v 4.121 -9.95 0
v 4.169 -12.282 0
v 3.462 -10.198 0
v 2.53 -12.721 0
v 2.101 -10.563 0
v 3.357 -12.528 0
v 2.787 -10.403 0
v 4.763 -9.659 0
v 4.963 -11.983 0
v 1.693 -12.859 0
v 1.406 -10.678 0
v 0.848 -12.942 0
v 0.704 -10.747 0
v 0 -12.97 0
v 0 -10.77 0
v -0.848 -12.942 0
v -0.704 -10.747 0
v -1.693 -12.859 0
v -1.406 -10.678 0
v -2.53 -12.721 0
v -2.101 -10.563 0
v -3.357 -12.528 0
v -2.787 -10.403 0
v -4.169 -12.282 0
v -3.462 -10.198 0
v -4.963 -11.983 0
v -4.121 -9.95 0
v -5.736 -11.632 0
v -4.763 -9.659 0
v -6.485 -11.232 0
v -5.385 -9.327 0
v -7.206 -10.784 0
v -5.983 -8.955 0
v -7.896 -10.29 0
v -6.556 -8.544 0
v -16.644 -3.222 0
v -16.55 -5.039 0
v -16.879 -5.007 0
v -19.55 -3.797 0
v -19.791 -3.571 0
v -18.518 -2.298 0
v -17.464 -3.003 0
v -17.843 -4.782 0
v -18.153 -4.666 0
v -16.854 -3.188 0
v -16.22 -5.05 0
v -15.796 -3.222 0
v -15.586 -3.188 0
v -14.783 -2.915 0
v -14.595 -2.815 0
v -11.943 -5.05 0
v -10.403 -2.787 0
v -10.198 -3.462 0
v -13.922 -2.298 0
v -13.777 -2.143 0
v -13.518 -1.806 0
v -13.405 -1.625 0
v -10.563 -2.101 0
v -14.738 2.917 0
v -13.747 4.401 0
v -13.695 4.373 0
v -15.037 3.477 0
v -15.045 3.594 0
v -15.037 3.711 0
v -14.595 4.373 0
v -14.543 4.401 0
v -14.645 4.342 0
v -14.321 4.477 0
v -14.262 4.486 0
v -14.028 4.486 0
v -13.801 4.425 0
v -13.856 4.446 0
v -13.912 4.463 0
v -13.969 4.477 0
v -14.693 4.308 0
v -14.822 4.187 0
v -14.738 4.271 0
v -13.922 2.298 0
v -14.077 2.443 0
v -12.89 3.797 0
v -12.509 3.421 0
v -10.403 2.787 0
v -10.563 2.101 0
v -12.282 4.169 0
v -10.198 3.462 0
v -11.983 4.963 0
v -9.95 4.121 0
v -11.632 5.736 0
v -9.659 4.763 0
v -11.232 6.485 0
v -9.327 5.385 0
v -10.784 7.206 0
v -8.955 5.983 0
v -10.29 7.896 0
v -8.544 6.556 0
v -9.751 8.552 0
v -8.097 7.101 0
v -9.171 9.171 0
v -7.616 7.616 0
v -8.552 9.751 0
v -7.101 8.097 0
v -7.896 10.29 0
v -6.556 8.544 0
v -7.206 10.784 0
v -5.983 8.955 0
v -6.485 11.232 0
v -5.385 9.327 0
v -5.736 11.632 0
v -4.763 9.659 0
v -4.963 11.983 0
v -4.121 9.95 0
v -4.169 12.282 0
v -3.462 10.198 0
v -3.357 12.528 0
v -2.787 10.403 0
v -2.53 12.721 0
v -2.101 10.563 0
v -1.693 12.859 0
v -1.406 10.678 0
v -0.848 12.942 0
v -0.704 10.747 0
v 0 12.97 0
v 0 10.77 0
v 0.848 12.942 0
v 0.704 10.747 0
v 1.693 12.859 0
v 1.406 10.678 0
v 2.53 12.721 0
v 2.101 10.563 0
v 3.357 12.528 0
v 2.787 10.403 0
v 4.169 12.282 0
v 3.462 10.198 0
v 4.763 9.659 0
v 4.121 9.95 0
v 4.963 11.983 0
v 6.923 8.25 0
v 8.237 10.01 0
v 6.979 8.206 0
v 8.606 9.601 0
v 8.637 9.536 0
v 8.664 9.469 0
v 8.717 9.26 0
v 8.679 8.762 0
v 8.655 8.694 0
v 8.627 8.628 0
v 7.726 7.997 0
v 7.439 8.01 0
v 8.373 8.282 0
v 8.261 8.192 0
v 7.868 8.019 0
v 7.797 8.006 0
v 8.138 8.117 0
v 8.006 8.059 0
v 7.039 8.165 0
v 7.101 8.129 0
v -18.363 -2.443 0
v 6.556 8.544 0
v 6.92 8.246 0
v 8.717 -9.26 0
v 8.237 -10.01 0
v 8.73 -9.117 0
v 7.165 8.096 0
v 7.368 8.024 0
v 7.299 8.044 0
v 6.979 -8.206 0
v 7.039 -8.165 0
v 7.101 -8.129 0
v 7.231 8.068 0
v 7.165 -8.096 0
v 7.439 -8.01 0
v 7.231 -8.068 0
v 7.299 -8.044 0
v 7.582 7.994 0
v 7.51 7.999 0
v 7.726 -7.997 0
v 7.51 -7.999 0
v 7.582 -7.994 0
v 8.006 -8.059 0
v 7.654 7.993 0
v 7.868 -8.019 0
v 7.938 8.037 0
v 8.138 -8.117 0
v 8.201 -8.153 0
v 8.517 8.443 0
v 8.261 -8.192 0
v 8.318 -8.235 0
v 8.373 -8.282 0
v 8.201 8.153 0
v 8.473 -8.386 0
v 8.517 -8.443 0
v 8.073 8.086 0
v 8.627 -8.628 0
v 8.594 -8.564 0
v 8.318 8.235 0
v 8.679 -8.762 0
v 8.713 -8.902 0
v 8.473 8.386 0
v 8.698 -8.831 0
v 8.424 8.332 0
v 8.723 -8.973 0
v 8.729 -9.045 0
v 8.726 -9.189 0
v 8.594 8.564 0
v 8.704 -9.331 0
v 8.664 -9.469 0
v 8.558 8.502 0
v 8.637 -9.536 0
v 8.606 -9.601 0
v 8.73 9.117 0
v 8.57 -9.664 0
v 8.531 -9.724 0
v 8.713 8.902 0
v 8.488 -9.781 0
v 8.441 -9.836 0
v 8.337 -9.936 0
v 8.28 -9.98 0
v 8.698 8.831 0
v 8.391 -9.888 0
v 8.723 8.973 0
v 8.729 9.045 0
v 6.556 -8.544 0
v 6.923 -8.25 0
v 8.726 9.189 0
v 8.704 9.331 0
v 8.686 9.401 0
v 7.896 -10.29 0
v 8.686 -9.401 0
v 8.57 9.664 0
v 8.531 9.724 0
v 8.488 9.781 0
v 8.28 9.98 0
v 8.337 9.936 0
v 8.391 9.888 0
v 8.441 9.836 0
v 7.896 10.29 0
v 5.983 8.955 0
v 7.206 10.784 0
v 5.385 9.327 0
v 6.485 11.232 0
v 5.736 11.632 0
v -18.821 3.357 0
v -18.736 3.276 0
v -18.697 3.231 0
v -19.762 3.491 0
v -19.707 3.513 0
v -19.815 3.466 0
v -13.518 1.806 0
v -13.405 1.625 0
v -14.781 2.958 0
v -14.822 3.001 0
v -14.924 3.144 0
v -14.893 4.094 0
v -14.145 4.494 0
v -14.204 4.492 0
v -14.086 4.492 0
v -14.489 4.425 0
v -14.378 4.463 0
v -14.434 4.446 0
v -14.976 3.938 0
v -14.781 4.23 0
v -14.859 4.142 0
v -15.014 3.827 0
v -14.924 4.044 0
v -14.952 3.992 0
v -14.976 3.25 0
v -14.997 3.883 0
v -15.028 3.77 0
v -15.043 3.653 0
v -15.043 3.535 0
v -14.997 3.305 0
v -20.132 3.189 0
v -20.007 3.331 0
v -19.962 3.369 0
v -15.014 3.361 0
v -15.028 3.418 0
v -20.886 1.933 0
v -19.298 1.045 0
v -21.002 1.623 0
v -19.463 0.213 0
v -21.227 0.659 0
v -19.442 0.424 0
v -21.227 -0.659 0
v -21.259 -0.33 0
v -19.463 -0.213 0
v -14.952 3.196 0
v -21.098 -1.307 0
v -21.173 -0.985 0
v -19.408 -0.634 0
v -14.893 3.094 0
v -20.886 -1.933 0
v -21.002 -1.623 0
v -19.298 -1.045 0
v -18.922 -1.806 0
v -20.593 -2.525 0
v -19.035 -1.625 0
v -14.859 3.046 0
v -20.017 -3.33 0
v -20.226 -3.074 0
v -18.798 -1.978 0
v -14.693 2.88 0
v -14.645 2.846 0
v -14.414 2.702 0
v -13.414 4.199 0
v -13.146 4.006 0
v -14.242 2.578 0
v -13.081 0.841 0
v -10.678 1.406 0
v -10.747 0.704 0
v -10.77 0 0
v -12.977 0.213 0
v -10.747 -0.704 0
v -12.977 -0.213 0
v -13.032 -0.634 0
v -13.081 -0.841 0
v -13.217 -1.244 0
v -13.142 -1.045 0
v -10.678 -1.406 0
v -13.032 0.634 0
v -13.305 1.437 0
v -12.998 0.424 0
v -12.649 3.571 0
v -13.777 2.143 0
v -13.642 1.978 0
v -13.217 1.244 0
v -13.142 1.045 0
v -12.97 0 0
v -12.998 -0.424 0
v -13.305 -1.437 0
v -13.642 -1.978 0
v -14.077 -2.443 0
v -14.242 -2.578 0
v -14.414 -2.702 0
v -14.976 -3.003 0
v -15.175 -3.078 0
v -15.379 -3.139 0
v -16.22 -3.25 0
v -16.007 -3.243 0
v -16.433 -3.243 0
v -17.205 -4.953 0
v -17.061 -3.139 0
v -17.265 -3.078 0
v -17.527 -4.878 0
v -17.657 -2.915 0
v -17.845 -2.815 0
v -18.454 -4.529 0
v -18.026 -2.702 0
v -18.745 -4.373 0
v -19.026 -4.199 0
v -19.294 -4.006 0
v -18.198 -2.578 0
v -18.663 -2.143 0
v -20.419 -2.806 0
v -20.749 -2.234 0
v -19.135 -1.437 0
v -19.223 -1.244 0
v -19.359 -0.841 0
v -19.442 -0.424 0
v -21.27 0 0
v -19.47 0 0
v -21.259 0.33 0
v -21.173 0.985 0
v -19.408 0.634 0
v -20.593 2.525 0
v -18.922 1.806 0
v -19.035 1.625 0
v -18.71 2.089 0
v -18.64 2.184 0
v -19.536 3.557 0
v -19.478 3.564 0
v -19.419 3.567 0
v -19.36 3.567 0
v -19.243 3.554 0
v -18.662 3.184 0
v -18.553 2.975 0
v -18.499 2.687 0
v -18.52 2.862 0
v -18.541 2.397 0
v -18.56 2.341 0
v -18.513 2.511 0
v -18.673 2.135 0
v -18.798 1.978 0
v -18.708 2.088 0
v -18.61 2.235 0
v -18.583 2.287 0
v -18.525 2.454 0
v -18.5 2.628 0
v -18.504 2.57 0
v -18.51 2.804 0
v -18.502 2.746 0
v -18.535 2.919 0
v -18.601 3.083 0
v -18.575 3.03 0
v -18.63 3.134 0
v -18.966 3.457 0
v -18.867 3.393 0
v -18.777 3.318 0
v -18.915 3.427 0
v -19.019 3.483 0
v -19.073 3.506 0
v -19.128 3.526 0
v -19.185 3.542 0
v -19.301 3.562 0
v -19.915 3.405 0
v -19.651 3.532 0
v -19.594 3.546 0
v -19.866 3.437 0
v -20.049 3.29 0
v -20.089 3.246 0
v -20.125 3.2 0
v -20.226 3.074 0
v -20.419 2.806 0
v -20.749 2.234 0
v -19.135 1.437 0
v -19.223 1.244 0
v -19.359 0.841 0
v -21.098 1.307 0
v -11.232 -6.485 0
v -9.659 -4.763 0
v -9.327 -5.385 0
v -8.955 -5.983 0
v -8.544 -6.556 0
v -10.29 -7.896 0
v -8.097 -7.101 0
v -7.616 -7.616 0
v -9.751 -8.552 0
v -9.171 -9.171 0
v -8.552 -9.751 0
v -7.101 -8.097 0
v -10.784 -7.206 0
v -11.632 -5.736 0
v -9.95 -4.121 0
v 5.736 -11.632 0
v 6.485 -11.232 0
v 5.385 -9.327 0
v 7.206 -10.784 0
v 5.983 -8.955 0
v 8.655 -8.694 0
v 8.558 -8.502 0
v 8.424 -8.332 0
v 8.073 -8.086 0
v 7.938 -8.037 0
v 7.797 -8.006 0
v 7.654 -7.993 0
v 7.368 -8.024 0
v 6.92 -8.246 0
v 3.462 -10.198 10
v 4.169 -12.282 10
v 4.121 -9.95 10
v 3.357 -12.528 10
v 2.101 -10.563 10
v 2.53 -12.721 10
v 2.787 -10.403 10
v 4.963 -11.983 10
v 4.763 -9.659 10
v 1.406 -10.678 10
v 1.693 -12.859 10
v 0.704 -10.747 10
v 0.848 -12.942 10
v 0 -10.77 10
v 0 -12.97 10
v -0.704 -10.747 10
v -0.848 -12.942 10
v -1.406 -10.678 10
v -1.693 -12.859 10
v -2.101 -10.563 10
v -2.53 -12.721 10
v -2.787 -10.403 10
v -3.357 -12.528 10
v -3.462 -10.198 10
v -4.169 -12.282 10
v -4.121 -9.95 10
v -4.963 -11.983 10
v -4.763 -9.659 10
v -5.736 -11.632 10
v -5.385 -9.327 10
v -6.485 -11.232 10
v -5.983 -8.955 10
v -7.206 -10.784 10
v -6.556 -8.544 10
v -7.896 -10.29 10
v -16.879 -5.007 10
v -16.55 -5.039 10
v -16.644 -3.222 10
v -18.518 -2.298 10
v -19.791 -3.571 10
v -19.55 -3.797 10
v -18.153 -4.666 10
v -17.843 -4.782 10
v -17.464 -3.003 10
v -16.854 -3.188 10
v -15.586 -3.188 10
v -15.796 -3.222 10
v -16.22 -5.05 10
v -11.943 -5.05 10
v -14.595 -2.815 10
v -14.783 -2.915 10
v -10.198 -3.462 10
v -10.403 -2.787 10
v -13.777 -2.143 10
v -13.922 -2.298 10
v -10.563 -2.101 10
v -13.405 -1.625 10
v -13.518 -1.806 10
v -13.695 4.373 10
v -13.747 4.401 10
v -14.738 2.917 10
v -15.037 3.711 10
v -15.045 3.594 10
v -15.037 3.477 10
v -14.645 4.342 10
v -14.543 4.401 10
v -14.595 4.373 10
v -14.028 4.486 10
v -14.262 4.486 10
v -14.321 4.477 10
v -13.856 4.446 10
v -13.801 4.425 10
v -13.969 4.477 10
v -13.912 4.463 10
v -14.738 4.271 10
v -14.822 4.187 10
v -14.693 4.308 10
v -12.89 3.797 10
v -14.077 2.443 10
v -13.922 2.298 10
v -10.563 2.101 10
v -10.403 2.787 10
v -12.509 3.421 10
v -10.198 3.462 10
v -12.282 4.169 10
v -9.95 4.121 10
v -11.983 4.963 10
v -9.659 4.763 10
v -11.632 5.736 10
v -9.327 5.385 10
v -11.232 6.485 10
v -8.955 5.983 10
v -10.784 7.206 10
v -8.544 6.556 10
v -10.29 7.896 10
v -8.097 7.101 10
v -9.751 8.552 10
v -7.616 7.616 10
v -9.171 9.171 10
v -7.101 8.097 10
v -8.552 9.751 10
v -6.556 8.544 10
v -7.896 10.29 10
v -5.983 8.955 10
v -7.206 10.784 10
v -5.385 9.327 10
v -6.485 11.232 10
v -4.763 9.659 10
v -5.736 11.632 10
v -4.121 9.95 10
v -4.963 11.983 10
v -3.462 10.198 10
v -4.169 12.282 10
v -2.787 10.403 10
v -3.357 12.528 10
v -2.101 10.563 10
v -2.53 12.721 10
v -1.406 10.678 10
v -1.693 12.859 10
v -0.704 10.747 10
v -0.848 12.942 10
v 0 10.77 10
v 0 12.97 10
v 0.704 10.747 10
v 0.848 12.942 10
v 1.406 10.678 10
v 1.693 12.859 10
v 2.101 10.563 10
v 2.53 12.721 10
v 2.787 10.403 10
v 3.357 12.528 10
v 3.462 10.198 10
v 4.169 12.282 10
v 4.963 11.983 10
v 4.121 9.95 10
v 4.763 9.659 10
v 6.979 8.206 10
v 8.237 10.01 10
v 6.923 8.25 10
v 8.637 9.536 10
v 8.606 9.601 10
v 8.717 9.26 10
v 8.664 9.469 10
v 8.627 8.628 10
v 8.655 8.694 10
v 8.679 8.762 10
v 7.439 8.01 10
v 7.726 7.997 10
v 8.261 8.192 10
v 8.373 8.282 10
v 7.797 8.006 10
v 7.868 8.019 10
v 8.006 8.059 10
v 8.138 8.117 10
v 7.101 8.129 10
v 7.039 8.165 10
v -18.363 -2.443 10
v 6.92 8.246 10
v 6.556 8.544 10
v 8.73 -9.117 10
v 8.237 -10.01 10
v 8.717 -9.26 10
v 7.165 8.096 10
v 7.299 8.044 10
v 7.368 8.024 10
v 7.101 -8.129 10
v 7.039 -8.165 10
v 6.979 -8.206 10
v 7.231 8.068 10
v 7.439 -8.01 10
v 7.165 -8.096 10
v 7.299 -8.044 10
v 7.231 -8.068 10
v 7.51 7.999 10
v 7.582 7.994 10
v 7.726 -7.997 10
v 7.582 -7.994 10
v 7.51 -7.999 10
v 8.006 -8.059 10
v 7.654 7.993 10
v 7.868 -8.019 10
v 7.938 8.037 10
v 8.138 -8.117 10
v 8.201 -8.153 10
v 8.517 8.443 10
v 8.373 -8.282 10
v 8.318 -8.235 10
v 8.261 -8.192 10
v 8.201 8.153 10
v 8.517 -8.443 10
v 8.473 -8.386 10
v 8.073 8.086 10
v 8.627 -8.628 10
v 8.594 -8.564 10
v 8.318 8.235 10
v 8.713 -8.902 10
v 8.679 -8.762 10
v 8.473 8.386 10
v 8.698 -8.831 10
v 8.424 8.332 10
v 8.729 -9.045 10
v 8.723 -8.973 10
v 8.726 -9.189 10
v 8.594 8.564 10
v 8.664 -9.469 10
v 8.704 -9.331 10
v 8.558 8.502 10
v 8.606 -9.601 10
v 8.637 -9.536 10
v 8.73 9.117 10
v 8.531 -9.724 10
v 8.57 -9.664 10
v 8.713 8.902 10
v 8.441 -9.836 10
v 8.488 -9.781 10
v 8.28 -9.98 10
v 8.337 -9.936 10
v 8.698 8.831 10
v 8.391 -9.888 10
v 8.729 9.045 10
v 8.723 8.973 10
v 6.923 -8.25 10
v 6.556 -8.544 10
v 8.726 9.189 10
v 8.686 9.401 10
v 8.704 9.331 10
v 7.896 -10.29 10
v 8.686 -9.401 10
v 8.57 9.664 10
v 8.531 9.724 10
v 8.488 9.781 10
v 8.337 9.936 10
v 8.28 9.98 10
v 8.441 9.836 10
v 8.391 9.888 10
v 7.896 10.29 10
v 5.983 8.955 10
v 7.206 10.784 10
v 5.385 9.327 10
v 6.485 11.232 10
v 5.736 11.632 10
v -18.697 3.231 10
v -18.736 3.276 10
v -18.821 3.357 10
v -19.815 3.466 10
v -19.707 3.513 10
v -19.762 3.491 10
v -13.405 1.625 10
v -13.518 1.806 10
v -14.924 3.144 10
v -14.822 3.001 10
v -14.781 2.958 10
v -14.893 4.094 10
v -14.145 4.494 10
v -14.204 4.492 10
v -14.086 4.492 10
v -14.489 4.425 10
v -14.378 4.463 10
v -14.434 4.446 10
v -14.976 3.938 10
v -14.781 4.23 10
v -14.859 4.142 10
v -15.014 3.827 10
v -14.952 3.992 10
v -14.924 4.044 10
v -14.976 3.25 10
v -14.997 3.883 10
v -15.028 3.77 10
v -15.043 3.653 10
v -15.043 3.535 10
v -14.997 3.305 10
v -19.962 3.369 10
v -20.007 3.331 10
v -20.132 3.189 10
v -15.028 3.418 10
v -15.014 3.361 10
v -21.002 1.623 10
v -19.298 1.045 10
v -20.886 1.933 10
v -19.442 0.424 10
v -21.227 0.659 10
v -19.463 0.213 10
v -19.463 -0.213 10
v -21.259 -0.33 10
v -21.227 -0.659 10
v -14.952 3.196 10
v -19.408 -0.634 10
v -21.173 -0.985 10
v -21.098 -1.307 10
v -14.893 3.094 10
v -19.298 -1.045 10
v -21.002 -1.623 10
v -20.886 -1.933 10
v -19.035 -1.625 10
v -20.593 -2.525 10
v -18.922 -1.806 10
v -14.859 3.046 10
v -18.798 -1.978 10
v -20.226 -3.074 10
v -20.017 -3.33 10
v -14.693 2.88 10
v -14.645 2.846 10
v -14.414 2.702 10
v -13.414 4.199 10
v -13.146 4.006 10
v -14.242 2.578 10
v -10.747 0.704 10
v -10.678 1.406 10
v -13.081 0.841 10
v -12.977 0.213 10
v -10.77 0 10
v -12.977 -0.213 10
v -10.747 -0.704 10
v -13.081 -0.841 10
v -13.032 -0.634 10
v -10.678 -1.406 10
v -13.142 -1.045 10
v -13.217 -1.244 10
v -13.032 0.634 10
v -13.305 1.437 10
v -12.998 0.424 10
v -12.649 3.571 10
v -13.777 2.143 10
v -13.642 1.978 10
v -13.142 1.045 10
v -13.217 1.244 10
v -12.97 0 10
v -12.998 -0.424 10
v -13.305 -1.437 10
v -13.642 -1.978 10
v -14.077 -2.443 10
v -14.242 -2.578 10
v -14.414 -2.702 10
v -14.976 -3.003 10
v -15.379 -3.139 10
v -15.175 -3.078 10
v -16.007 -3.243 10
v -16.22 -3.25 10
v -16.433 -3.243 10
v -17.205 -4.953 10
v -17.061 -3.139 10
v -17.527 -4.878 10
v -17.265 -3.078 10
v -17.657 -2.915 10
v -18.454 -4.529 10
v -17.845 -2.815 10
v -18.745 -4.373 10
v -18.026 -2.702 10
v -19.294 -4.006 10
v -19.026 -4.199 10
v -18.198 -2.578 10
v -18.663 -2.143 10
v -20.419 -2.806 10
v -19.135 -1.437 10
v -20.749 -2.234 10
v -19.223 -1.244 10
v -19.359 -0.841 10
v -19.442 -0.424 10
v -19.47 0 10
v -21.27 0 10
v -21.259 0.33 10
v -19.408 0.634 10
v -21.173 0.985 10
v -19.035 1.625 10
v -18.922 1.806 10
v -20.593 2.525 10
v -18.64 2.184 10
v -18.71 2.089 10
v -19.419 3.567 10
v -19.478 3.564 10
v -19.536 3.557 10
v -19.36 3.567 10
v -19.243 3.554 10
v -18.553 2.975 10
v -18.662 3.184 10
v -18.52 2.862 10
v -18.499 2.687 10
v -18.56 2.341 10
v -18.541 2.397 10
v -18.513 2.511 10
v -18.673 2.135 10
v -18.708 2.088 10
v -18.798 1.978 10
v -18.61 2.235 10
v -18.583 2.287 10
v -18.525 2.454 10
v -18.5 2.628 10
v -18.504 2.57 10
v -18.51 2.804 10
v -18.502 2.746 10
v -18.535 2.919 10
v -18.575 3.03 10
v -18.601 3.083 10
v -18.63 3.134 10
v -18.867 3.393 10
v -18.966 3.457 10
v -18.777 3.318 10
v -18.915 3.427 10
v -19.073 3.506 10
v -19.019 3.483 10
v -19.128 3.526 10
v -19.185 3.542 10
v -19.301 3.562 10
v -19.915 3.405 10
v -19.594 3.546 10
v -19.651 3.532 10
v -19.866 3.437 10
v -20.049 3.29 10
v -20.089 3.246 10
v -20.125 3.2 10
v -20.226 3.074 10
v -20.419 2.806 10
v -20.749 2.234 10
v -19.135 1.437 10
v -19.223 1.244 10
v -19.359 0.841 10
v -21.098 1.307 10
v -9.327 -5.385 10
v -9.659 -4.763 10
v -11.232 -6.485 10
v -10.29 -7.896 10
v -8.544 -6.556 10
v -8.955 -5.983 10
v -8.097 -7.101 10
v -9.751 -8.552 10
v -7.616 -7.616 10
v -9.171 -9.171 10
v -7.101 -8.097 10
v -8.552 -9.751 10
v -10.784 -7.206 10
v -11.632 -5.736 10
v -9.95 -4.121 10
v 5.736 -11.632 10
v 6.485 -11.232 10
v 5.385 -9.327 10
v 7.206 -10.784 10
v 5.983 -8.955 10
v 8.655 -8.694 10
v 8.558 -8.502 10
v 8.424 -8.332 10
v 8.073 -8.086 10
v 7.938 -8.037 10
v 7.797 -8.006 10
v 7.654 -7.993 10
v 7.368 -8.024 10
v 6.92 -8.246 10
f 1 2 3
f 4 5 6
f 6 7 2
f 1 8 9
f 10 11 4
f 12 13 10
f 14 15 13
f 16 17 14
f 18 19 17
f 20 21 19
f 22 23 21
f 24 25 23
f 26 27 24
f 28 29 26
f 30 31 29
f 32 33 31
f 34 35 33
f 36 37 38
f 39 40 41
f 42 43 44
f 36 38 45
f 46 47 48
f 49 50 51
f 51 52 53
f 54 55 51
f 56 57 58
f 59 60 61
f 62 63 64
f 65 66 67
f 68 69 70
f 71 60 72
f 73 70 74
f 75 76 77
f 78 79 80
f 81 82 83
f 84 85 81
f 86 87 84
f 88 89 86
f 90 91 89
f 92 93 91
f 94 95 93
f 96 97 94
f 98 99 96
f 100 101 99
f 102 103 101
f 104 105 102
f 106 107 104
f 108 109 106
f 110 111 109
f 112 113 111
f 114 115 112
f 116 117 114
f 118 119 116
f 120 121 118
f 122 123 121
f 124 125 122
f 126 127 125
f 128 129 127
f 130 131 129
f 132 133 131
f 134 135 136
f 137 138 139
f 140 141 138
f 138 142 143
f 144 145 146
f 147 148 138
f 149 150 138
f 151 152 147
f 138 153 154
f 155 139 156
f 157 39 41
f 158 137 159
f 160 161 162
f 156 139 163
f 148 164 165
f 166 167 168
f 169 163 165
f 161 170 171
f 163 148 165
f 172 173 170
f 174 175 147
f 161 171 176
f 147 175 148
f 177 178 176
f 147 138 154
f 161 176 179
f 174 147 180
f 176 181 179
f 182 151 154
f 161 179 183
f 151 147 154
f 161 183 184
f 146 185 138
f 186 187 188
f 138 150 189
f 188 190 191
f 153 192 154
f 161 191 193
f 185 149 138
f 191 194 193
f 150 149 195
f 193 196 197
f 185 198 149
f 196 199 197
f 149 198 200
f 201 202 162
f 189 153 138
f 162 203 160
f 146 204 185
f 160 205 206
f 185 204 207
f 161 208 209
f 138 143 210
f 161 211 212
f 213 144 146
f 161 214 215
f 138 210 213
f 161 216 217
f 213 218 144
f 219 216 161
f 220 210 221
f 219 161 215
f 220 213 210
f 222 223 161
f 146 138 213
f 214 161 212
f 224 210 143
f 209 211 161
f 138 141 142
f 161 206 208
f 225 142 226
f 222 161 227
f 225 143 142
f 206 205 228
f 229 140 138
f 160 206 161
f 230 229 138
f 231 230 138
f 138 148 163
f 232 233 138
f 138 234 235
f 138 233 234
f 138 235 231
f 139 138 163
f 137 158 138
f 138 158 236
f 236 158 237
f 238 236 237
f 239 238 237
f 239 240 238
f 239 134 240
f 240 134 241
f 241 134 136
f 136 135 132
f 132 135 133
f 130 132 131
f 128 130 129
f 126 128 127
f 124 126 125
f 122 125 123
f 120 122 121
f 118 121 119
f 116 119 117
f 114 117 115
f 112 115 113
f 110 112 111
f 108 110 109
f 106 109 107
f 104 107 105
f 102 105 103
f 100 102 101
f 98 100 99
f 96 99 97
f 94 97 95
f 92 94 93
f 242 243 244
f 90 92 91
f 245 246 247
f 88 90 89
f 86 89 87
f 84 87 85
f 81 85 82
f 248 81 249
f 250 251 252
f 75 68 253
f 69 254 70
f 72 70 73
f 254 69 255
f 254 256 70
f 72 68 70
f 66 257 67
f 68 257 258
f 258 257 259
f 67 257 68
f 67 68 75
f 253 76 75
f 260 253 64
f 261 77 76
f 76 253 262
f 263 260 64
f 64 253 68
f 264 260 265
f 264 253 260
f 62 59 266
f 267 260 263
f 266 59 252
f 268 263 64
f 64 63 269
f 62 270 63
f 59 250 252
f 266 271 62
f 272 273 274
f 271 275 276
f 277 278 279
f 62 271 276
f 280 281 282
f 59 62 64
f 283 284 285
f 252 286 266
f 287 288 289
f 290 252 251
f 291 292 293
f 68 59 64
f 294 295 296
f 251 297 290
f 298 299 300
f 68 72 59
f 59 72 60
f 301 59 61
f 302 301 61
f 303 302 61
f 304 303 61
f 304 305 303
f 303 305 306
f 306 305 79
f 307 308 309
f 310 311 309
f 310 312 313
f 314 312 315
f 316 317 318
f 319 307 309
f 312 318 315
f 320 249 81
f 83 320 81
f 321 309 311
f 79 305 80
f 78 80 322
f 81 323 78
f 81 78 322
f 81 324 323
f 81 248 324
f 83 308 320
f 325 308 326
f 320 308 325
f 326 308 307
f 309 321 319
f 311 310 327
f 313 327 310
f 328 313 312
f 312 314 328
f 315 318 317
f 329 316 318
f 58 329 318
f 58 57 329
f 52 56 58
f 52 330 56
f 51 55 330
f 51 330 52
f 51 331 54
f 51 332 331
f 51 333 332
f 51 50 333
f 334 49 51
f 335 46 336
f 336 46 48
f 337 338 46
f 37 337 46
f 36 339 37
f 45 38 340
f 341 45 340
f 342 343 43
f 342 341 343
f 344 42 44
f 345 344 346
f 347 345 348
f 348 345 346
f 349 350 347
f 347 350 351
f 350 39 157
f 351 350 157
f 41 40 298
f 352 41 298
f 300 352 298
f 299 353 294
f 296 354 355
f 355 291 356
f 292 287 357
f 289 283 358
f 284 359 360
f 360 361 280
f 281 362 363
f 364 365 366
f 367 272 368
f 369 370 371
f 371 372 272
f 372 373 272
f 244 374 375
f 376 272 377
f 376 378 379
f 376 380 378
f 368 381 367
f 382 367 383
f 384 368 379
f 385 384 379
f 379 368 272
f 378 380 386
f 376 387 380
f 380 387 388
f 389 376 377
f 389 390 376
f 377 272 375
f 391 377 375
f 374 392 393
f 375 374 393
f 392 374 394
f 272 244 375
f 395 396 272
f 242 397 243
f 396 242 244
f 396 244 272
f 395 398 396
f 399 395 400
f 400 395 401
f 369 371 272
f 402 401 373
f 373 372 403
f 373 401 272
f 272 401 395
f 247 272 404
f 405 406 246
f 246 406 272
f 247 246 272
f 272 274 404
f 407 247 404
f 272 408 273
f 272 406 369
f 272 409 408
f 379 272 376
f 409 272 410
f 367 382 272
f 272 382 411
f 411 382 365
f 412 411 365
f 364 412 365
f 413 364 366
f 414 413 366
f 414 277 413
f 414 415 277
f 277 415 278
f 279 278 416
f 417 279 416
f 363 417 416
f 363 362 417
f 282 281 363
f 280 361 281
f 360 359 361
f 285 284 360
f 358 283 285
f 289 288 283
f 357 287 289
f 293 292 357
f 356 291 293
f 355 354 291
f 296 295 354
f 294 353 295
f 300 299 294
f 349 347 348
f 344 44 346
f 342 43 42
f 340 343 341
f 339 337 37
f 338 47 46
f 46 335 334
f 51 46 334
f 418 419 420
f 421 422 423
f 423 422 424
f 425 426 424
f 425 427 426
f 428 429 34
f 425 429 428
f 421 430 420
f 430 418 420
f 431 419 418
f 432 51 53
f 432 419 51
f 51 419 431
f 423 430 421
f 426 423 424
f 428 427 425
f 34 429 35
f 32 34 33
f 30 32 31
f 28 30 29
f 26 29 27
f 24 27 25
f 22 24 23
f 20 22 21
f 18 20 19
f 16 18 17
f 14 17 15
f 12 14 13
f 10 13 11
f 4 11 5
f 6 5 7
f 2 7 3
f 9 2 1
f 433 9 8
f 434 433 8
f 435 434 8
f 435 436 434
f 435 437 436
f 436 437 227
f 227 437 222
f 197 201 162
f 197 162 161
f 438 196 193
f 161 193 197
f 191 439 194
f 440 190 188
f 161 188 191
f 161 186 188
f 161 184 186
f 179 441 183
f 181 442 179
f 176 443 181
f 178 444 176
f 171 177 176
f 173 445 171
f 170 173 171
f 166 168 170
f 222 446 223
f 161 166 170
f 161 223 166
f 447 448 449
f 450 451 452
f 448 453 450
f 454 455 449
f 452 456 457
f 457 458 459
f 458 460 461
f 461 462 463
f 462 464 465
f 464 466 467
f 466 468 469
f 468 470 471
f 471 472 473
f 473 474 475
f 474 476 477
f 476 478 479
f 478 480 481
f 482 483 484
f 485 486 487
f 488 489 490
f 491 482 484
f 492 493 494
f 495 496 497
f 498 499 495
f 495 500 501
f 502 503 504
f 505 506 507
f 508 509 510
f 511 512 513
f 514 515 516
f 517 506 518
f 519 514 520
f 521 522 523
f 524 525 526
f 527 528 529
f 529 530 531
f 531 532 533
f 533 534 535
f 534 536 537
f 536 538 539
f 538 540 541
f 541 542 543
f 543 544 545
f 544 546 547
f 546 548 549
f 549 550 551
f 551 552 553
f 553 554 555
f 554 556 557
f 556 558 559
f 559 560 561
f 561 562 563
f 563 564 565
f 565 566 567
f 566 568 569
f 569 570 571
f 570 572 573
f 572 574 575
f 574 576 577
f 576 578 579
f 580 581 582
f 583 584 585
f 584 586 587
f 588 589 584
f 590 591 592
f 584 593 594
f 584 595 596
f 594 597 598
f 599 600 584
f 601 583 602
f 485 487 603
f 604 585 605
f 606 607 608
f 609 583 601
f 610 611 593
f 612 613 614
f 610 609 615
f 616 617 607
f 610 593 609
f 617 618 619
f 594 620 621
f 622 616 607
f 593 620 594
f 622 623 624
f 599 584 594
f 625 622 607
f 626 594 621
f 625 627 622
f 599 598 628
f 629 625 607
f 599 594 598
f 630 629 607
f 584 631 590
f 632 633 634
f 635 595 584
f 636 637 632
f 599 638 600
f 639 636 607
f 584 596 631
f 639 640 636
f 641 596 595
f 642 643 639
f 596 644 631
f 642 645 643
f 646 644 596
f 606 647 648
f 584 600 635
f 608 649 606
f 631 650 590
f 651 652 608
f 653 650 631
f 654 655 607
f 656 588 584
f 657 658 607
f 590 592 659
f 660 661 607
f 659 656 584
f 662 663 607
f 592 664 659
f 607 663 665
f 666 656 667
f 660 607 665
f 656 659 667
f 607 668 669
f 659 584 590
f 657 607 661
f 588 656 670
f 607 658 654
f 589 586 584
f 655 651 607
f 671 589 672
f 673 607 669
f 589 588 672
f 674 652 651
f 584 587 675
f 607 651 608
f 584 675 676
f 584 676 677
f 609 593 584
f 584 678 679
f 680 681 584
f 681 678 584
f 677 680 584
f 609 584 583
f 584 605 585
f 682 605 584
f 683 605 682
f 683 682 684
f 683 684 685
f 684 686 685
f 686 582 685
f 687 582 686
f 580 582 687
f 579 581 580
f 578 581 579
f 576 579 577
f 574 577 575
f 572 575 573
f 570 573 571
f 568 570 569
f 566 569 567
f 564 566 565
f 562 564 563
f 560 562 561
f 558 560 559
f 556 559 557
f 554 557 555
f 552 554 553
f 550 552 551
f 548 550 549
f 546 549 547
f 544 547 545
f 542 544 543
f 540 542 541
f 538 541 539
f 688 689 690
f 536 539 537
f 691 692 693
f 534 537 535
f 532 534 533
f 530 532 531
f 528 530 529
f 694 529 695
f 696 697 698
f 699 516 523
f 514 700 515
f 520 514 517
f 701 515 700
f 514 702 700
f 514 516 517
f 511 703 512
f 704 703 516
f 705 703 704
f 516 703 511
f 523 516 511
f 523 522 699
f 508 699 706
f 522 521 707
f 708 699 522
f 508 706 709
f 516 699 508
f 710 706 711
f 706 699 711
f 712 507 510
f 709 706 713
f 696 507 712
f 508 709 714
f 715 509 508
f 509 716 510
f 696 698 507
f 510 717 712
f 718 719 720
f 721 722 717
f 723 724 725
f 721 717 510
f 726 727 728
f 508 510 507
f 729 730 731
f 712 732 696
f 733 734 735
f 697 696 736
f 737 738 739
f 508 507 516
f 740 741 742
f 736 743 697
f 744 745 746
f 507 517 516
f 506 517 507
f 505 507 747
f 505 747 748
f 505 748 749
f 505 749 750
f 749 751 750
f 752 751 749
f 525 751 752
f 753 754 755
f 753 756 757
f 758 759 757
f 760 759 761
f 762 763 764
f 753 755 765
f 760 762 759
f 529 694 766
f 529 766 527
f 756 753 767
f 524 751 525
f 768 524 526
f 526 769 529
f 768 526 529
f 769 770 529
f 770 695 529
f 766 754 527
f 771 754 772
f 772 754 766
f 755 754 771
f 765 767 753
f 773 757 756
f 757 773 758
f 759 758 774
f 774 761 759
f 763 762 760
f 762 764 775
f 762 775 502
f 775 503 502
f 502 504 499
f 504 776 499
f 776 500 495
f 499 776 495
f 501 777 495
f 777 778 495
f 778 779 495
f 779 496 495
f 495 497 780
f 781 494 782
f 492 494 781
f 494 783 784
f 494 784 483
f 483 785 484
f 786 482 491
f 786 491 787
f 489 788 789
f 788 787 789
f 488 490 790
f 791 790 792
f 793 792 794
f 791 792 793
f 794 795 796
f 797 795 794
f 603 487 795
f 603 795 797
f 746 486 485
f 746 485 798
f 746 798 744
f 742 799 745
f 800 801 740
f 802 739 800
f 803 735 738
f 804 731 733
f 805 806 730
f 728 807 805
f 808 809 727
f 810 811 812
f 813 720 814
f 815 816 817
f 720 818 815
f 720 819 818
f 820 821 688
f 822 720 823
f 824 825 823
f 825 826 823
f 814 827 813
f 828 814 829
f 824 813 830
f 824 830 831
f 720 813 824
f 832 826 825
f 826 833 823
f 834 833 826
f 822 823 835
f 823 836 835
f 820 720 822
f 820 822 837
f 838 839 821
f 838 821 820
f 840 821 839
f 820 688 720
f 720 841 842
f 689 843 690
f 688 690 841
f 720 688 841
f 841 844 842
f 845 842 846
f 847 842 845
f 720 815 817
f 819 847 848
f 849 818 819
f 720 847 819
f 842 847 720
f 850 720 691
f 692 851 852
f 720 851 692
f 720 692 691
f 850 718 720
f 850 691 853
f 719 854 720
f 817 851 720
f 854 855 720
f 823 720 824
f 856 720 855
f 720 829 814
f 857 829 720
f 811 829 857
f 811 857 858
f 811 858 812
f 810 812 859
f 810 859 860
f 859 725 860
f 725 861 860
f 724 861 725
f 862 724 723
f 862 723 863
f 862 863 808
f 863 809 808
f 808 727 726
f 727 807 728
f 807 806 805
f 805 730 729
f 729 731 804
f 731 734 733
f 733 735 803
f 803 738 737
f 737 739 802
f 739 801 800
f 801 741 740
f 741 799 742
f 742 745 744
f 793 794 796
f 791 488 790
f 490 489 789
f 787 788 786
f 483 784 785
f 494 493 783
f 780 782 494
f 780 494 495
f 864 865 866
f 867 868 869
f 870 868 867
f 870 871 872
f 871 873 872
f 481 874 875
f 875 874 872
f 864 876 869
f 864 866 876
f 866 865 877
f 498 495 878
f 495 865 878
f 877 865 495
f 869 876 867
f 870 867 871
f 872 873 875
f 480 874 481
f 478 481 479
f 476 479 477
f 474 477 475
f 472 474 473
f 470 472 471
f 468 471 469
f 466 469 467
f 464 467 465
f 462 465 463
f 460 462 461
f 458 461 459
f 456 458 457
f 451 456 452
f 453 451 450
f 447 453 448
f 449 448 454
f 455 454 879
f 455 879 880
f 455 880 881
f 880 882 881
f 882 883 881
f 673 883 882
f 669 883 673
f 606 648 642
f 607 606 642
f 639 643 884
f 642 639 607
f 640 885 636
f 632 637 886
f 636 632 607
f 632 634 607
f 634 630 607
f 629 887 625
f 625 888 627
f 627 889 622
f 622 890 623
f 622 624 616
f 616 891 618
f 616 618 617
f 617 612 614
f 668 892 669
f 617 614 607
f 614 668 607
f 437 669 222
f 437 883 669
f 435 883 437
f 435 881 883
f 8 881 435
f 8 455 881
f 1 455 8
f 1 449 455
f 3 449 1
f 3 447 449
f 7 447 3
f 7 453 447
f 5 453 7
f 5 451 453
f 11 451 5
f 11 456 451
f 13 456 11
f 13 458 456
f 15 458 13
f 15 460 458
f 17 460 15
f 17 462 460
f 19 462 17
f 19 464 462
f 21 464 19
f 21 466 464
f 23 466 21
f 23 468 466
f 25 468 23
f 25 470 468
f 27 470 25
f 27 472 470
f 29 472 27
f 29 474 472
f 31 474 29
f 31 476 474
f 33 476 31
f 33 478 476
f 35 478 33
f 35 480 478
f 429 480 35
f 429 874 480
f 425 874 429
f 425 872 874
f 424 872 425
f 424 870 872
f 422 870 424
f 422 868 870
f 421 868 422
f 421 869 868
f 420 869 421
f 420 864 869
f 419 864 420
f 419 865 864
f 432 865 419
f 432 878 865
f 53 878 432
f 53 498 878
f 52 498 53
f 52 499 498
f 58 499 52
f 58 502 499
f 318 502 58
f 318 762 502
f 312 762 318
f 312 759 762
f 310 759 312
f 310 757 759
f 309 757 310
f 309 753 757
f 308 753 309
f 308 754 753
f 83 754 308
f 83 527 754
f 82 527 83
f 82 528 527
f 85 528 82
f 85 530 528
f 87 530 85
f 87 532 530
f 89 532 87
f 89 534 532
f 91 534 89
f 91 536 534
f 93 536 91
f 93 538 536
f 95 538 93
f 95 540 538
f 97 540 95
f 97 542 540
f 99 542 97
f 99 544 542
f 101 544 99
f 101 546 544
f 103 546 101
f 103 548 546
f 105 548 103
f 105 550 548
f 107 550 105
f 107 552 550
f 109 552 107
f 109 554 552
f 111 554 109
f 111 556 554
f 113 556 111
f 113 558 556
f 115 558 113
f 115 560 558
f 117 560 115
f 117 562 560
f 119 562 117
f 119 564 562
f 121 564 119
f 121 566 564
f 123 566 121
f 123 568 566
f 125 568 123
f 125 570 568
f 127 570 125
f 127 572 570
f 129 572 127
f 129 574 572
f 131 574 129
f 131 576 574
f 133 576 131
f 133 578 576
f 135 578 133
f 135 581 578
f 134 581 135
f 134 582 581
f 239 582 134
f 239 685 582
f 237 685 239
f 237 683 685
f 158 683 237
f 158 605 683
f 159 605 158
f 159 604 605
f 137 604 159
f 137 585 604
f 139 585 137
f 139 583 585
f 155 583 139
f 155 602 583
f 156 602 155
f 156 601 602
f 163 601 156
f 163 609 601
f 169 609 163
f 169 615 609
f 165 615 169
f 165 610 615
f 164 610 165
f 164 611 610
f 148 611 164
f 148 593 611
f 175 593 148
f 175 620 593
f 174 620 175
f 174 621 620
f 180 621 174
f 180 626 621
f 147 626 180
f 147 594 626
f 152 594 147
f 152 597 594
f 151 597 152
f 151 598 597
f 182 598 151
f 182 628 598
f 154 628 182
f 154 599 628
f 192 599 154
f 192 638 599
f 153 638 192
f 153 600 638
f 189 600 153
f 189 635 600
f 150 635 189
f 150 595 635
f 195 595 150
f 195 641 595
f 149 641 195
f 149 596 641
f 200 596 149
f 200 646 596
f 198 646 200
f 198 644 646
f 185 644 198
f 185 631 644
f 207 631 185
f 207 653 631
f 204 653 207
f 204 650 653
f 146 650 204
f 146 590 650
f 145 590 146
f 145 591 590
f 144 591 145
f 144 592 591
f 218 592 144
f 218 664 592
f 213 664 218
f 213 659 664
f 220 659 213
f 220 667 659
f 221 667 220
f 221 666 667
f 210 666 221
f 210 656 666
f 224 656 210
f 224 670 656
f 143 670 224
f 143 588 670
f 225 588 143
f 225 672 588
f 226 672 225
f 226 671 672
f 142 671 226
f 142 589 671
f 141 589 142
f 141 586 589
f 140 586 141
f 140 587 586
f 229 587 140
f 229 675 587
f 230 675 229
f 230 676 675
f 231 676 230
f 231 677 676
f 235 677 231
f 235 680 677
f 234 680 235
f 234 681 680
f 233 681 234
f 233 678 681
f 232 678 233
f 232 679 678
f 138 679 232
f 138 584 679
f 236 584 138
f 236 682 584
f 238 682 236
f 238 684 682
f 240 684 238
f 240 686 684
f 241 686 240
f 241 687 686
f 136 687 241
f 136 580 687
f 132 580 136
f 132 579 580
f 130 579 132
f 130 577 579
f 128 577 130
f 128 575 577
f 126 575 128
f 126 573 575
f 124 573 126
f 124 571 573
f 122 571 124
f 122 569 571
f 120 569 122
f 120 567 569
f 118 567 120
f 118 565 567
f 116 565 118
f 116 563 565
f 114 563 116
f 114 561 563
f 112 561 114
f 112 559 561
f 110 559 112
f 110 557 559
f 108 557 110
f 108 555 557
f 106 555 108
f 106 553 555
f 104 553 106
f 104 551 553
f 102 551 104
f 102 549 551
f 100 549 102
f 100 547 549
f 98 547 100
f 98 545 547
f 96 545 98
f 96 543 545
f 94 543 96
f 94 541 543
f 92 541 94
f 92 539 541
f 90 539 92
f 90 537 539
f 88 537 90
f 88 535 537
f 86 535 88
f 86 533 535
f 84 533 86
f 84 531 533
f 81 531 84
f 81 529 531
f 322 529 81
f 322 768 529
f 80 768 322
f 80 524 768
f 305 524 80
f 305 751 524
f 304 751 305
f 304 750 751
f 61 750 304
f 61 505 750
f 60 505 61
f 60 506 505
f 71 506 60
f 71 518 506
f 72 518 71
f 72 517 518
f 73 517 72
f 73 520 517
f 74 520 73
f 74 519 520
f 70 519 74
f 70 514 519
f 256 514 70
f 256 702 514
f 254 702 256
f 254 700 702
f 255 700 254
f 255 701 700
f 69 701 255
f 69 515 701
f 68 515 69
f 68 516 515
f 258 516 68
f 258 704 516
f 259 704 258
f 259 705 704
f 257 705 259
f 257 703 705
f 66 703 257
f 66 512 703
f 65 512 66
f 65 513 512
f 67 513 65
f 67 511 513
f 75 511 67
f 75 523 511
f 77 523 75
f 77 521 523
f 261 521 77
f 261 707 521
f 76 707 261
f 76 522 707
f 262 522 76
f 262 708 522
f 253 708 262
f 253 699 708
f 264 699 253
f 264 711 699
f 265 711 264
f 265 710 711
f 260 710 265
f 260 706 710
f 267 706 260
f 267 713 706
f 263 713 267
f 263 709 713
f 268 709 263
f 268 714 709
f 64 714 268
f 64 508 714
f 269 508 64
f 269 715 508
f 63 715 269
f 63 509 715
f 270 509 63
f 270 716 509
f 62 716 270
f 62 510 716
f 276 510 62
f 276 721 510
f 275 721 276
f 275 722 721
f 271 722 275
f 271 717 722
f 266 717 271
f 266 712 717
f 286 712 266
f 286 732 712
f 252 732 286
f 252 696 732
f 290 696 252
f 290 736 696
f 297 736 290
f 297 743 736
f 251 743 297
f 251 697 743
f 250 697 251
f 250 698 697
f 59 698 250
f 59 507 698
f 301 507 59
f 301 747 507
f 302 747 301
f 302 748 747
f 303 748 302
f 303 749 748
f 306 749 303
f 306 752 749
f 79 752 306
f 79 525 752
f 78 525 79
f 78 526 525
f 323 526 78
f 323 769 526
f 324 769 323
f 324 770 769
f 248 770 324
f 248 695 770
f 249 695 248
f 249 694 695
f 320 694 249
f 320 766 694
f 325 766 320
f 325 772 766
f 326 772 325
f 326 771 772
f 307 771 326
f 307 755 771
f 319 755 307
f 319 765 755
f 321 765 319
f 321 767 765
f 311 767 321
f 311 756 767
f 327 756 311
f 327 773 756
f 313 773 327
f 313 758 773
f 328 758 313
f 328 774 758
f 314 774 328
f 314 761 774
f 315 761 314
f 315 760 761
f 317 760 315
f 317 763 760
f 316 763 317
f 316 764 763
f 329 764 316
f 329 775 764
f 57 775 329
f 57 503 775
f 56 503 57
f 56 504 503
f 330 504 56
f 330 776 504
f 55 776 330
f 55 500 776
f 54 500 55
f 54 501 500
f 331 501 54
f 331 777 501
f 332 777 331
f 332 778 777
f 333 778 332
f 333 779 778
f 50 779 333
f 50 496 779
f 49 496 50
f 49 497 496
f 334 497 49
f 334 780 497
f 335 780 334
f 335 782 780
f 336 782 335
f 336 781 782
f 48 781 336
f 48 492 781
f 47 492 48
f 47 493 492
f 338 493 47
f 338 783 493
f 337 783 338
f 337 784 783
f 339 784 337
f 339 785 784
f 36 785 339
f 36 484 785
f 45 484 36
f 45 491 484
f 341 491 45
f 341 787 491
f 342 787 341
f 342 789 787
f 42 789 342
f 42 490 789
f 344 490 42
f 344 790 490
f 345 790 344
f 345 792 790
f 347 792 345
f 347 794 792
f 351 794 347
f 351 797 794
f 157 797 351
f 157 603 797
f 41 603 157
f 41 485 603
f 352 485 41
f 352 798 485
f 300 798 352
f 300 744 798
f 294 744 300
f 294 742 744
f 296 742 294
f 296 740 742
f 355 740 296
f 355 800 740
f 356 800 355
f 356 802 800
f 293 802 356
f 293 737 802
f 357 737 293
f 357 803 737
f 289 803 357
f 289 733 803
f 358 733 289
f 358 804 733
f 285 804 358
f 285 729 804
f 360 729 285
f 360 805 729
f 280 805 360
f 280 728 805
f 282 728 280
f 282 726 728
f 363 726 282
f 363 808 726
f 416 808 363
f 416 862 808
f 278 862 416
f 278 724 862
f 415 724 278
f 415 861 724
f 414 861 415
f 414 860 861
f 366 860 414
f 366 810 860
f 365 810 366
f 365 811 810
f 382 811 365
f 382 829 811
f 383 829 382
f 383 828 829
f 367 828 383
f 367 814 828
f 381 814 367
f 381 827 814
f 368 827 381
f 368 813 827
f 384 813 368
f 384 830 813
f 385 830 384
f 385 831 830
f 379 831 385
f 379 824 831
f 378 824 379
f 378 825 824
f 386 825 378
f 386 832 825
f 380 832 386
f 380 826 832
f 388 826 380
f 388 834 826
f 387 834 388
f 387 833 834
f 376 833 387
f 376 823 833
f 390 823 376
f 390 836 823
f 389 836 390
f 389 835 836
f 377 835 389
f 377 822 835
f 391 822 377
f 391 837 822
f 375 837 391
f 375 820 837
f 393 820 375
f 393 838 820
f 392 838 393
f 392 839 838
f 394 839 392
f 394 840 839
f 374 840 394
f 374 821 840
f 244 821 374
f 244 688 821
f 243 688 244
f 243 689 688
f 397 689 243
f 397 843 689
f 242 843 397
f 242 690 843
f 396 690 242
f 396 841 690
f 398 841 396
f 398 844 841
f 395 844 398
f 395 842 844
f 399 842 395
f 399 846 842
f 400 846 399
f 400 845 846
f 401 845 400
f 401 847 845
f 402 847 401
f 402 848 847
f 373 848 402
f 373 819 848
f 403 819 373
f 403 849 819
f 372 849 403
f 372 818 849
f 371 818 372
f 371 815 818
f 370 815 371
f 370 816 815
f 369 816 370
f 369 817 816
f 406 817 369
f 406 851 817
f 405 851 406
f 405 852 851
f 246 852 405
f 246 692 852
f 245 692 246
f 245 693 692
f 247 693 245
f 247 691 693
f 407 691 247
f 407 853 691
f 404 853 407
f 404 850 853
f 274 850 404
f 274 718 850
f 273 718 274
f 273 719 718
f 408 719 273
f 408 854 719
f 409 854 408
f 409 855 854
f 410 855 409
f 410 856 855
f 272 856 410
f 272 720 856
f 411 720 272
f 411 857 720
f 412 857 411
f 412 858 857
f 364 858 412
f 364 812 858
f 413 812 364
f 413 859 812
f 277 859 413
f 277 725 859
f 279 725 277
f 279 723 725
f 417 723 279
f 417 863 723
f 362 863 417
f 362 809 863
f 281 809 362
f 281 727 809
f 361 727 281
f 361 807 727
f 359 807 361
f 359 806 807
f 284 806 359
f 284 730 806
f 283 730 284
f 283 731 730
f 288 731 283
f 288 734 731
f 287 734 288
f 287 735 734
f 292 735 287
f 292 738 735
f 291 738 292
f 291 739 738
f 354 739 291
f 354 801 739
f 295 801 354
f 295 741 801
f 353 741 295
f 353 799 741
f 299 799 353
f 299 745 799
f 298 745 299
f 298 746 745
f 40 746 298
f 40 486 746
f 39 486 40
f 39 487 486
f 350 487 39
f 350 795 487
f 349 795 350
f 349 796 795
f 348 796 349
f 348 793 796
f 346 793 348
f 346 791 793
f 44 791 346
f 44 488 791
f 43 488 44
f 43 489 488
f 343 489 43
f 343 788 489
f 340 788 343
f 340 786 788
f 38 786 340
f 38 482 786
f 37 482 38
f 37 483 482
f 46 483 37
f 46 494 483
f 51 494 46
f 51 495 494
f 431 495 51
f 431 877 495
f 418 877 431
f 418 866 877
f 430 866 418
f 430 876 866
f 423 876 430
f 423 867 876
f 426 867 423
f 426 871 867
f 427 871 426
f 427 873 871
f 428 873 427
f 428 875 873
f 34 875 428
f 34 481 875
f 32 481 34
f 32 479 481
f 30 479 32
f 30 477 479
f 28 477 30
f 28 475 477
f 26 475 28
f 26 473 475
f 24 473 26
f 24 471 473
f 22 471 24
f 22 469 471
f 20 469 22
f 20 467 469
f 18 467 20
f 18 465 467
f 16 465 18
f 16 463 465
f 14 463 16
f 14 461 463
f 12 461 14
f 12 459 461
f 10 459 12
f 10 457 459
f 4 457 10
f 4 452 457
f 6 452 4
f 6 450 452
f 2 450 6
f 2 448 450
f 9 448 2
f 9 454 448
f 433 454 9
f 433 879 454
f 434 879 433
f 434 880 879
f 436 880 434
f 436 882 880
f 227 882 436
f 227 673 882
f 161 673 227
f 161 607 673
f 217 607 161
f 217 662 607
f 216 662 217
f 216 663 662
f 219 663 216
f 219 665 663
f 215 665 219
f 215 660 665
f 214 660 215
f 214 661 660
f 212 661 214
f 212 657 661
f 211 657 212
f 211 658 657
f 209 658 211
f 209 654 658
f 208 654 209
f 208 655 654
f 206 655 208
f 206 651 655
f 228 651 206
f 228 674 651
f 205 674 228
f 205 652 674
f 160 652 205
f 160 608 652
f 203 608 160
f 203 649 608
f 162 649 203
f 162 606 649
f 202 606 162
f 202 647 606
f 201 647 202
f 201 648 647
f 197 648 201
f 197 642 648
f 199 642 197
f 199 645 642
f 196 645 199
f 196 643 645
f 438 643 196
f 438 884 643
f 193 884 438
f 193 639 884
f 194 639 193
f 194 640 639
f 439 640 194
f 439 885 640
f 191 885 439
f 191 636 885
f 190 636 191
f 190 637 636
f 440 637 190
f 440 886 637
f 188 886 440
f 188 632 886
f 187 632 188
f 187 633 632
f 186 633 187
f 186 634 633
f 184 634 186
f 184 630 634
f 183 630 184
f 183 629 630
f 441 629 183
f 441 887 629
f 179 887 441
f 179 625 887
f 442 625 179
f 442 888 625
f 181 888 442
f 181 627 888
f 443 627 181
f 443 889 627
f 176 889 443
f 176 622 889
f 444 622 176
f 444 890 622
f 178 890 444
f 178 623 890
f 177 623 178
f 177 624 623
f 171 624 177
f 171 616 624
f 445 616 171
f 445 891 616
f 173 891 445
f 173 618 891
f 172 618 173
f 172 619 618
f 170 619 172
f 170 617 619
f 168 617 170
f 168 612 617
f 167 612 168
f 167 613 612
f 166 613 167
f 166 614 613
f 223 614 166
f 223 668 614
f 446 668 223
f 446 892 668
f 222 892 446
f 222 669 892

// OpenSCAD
// OFT: Ethernet cable guide for a gate made from 1/2 in PVC pipe.
//
// A clip that snaps onto the pipe with a smaller clip beside it for the cable. Use one every
// 30 cm or so down the gate, and one close to the Timer's case as strain relief.
// One flat extrusion: print lying down as exported, no supports. The layers run around
// both rings, which is the strong direction for a clip.

/* [Pipe] */
pipe_od = 21.34;         // 1/2 in schedule 40 PVC
pipe_clear = 0.2;
pipe_wall = 2.2;
pipe_open = 100;         // mouth angle (same as the case's clip)

/* [Cable] */
cable_d = 6.0;           // round Cat5e is about 5.5, Cat6 about 6
cable_clear = 0.5;       // the cable should slide, not be squeezed
cable_wall = 1.8;
cable_open = 80;         // mouth angle; the cable pushes in past the lips
cable_dir = 100;         // where the cable mouth faces (90 = at right angles to the pipe mouth)

/* [Body] */
width = 10;              // length along the pipe

/* [Hidden] */
$fn = 96;
pid = pipe_od + pipe_clear;
cid = cable_d + cable_clear;
cx = -(pid / 2 + pipe_wall + cid / 2);   // cable centre: its bore touches the pipe ring's outside

echo(str("pipe mouth ", pid * sin(pipe_open / 2), " for pipe ", pipe_od,
         "; cable mouth ", cid * sin(cable_open / 2), " for cable ", cable_d));

module wedge(a, r) { polygon([[0, 0], r * [cos(a / 2), sin(a / 2)], r * [1 / cos(a / 2), 0], r * [cos(a / 2), -sin(a / 2)]]); }
module lips(d, wall, a) { for (s = [-1, 1]) rotate(s * a / 2) translate([d / 2 + wall / 2, 0]) circle(d = wall); }

module guide2d() {
    difference() {
        union() {
            circle(d = pid + 2 * pipe_wall);
            translate([cx, 0]) circle(d = cid + 2 * cable_wall);
            // web between the rings on the side away from the cable mouth
            intersection() {
                hull() { circle(d = pid + 2 * pipe_wall); translate([cx, 0]) circle(d = cid + 2 * cable_wall); }
                translate([cx, -(cid / 2 + cable_wall)]) square([-cx, cid / 2 + cable_wall]);
            }
        }
        circle(d = pid);
        wedge(pipe_open, 40);
        translate([cx, 0]) { circle(d = cid); rotate(cable_dir) wedge(cable_open, cid / 2 + cable_wall + 0.3); }
    }
    lips(pid, pipe_wall, pipe_open);
    translate([cx, 0]) rotate(cable_dir) lips(cid, cable_wall, cable_open);
}

linear_extrude(width) guide2d();
